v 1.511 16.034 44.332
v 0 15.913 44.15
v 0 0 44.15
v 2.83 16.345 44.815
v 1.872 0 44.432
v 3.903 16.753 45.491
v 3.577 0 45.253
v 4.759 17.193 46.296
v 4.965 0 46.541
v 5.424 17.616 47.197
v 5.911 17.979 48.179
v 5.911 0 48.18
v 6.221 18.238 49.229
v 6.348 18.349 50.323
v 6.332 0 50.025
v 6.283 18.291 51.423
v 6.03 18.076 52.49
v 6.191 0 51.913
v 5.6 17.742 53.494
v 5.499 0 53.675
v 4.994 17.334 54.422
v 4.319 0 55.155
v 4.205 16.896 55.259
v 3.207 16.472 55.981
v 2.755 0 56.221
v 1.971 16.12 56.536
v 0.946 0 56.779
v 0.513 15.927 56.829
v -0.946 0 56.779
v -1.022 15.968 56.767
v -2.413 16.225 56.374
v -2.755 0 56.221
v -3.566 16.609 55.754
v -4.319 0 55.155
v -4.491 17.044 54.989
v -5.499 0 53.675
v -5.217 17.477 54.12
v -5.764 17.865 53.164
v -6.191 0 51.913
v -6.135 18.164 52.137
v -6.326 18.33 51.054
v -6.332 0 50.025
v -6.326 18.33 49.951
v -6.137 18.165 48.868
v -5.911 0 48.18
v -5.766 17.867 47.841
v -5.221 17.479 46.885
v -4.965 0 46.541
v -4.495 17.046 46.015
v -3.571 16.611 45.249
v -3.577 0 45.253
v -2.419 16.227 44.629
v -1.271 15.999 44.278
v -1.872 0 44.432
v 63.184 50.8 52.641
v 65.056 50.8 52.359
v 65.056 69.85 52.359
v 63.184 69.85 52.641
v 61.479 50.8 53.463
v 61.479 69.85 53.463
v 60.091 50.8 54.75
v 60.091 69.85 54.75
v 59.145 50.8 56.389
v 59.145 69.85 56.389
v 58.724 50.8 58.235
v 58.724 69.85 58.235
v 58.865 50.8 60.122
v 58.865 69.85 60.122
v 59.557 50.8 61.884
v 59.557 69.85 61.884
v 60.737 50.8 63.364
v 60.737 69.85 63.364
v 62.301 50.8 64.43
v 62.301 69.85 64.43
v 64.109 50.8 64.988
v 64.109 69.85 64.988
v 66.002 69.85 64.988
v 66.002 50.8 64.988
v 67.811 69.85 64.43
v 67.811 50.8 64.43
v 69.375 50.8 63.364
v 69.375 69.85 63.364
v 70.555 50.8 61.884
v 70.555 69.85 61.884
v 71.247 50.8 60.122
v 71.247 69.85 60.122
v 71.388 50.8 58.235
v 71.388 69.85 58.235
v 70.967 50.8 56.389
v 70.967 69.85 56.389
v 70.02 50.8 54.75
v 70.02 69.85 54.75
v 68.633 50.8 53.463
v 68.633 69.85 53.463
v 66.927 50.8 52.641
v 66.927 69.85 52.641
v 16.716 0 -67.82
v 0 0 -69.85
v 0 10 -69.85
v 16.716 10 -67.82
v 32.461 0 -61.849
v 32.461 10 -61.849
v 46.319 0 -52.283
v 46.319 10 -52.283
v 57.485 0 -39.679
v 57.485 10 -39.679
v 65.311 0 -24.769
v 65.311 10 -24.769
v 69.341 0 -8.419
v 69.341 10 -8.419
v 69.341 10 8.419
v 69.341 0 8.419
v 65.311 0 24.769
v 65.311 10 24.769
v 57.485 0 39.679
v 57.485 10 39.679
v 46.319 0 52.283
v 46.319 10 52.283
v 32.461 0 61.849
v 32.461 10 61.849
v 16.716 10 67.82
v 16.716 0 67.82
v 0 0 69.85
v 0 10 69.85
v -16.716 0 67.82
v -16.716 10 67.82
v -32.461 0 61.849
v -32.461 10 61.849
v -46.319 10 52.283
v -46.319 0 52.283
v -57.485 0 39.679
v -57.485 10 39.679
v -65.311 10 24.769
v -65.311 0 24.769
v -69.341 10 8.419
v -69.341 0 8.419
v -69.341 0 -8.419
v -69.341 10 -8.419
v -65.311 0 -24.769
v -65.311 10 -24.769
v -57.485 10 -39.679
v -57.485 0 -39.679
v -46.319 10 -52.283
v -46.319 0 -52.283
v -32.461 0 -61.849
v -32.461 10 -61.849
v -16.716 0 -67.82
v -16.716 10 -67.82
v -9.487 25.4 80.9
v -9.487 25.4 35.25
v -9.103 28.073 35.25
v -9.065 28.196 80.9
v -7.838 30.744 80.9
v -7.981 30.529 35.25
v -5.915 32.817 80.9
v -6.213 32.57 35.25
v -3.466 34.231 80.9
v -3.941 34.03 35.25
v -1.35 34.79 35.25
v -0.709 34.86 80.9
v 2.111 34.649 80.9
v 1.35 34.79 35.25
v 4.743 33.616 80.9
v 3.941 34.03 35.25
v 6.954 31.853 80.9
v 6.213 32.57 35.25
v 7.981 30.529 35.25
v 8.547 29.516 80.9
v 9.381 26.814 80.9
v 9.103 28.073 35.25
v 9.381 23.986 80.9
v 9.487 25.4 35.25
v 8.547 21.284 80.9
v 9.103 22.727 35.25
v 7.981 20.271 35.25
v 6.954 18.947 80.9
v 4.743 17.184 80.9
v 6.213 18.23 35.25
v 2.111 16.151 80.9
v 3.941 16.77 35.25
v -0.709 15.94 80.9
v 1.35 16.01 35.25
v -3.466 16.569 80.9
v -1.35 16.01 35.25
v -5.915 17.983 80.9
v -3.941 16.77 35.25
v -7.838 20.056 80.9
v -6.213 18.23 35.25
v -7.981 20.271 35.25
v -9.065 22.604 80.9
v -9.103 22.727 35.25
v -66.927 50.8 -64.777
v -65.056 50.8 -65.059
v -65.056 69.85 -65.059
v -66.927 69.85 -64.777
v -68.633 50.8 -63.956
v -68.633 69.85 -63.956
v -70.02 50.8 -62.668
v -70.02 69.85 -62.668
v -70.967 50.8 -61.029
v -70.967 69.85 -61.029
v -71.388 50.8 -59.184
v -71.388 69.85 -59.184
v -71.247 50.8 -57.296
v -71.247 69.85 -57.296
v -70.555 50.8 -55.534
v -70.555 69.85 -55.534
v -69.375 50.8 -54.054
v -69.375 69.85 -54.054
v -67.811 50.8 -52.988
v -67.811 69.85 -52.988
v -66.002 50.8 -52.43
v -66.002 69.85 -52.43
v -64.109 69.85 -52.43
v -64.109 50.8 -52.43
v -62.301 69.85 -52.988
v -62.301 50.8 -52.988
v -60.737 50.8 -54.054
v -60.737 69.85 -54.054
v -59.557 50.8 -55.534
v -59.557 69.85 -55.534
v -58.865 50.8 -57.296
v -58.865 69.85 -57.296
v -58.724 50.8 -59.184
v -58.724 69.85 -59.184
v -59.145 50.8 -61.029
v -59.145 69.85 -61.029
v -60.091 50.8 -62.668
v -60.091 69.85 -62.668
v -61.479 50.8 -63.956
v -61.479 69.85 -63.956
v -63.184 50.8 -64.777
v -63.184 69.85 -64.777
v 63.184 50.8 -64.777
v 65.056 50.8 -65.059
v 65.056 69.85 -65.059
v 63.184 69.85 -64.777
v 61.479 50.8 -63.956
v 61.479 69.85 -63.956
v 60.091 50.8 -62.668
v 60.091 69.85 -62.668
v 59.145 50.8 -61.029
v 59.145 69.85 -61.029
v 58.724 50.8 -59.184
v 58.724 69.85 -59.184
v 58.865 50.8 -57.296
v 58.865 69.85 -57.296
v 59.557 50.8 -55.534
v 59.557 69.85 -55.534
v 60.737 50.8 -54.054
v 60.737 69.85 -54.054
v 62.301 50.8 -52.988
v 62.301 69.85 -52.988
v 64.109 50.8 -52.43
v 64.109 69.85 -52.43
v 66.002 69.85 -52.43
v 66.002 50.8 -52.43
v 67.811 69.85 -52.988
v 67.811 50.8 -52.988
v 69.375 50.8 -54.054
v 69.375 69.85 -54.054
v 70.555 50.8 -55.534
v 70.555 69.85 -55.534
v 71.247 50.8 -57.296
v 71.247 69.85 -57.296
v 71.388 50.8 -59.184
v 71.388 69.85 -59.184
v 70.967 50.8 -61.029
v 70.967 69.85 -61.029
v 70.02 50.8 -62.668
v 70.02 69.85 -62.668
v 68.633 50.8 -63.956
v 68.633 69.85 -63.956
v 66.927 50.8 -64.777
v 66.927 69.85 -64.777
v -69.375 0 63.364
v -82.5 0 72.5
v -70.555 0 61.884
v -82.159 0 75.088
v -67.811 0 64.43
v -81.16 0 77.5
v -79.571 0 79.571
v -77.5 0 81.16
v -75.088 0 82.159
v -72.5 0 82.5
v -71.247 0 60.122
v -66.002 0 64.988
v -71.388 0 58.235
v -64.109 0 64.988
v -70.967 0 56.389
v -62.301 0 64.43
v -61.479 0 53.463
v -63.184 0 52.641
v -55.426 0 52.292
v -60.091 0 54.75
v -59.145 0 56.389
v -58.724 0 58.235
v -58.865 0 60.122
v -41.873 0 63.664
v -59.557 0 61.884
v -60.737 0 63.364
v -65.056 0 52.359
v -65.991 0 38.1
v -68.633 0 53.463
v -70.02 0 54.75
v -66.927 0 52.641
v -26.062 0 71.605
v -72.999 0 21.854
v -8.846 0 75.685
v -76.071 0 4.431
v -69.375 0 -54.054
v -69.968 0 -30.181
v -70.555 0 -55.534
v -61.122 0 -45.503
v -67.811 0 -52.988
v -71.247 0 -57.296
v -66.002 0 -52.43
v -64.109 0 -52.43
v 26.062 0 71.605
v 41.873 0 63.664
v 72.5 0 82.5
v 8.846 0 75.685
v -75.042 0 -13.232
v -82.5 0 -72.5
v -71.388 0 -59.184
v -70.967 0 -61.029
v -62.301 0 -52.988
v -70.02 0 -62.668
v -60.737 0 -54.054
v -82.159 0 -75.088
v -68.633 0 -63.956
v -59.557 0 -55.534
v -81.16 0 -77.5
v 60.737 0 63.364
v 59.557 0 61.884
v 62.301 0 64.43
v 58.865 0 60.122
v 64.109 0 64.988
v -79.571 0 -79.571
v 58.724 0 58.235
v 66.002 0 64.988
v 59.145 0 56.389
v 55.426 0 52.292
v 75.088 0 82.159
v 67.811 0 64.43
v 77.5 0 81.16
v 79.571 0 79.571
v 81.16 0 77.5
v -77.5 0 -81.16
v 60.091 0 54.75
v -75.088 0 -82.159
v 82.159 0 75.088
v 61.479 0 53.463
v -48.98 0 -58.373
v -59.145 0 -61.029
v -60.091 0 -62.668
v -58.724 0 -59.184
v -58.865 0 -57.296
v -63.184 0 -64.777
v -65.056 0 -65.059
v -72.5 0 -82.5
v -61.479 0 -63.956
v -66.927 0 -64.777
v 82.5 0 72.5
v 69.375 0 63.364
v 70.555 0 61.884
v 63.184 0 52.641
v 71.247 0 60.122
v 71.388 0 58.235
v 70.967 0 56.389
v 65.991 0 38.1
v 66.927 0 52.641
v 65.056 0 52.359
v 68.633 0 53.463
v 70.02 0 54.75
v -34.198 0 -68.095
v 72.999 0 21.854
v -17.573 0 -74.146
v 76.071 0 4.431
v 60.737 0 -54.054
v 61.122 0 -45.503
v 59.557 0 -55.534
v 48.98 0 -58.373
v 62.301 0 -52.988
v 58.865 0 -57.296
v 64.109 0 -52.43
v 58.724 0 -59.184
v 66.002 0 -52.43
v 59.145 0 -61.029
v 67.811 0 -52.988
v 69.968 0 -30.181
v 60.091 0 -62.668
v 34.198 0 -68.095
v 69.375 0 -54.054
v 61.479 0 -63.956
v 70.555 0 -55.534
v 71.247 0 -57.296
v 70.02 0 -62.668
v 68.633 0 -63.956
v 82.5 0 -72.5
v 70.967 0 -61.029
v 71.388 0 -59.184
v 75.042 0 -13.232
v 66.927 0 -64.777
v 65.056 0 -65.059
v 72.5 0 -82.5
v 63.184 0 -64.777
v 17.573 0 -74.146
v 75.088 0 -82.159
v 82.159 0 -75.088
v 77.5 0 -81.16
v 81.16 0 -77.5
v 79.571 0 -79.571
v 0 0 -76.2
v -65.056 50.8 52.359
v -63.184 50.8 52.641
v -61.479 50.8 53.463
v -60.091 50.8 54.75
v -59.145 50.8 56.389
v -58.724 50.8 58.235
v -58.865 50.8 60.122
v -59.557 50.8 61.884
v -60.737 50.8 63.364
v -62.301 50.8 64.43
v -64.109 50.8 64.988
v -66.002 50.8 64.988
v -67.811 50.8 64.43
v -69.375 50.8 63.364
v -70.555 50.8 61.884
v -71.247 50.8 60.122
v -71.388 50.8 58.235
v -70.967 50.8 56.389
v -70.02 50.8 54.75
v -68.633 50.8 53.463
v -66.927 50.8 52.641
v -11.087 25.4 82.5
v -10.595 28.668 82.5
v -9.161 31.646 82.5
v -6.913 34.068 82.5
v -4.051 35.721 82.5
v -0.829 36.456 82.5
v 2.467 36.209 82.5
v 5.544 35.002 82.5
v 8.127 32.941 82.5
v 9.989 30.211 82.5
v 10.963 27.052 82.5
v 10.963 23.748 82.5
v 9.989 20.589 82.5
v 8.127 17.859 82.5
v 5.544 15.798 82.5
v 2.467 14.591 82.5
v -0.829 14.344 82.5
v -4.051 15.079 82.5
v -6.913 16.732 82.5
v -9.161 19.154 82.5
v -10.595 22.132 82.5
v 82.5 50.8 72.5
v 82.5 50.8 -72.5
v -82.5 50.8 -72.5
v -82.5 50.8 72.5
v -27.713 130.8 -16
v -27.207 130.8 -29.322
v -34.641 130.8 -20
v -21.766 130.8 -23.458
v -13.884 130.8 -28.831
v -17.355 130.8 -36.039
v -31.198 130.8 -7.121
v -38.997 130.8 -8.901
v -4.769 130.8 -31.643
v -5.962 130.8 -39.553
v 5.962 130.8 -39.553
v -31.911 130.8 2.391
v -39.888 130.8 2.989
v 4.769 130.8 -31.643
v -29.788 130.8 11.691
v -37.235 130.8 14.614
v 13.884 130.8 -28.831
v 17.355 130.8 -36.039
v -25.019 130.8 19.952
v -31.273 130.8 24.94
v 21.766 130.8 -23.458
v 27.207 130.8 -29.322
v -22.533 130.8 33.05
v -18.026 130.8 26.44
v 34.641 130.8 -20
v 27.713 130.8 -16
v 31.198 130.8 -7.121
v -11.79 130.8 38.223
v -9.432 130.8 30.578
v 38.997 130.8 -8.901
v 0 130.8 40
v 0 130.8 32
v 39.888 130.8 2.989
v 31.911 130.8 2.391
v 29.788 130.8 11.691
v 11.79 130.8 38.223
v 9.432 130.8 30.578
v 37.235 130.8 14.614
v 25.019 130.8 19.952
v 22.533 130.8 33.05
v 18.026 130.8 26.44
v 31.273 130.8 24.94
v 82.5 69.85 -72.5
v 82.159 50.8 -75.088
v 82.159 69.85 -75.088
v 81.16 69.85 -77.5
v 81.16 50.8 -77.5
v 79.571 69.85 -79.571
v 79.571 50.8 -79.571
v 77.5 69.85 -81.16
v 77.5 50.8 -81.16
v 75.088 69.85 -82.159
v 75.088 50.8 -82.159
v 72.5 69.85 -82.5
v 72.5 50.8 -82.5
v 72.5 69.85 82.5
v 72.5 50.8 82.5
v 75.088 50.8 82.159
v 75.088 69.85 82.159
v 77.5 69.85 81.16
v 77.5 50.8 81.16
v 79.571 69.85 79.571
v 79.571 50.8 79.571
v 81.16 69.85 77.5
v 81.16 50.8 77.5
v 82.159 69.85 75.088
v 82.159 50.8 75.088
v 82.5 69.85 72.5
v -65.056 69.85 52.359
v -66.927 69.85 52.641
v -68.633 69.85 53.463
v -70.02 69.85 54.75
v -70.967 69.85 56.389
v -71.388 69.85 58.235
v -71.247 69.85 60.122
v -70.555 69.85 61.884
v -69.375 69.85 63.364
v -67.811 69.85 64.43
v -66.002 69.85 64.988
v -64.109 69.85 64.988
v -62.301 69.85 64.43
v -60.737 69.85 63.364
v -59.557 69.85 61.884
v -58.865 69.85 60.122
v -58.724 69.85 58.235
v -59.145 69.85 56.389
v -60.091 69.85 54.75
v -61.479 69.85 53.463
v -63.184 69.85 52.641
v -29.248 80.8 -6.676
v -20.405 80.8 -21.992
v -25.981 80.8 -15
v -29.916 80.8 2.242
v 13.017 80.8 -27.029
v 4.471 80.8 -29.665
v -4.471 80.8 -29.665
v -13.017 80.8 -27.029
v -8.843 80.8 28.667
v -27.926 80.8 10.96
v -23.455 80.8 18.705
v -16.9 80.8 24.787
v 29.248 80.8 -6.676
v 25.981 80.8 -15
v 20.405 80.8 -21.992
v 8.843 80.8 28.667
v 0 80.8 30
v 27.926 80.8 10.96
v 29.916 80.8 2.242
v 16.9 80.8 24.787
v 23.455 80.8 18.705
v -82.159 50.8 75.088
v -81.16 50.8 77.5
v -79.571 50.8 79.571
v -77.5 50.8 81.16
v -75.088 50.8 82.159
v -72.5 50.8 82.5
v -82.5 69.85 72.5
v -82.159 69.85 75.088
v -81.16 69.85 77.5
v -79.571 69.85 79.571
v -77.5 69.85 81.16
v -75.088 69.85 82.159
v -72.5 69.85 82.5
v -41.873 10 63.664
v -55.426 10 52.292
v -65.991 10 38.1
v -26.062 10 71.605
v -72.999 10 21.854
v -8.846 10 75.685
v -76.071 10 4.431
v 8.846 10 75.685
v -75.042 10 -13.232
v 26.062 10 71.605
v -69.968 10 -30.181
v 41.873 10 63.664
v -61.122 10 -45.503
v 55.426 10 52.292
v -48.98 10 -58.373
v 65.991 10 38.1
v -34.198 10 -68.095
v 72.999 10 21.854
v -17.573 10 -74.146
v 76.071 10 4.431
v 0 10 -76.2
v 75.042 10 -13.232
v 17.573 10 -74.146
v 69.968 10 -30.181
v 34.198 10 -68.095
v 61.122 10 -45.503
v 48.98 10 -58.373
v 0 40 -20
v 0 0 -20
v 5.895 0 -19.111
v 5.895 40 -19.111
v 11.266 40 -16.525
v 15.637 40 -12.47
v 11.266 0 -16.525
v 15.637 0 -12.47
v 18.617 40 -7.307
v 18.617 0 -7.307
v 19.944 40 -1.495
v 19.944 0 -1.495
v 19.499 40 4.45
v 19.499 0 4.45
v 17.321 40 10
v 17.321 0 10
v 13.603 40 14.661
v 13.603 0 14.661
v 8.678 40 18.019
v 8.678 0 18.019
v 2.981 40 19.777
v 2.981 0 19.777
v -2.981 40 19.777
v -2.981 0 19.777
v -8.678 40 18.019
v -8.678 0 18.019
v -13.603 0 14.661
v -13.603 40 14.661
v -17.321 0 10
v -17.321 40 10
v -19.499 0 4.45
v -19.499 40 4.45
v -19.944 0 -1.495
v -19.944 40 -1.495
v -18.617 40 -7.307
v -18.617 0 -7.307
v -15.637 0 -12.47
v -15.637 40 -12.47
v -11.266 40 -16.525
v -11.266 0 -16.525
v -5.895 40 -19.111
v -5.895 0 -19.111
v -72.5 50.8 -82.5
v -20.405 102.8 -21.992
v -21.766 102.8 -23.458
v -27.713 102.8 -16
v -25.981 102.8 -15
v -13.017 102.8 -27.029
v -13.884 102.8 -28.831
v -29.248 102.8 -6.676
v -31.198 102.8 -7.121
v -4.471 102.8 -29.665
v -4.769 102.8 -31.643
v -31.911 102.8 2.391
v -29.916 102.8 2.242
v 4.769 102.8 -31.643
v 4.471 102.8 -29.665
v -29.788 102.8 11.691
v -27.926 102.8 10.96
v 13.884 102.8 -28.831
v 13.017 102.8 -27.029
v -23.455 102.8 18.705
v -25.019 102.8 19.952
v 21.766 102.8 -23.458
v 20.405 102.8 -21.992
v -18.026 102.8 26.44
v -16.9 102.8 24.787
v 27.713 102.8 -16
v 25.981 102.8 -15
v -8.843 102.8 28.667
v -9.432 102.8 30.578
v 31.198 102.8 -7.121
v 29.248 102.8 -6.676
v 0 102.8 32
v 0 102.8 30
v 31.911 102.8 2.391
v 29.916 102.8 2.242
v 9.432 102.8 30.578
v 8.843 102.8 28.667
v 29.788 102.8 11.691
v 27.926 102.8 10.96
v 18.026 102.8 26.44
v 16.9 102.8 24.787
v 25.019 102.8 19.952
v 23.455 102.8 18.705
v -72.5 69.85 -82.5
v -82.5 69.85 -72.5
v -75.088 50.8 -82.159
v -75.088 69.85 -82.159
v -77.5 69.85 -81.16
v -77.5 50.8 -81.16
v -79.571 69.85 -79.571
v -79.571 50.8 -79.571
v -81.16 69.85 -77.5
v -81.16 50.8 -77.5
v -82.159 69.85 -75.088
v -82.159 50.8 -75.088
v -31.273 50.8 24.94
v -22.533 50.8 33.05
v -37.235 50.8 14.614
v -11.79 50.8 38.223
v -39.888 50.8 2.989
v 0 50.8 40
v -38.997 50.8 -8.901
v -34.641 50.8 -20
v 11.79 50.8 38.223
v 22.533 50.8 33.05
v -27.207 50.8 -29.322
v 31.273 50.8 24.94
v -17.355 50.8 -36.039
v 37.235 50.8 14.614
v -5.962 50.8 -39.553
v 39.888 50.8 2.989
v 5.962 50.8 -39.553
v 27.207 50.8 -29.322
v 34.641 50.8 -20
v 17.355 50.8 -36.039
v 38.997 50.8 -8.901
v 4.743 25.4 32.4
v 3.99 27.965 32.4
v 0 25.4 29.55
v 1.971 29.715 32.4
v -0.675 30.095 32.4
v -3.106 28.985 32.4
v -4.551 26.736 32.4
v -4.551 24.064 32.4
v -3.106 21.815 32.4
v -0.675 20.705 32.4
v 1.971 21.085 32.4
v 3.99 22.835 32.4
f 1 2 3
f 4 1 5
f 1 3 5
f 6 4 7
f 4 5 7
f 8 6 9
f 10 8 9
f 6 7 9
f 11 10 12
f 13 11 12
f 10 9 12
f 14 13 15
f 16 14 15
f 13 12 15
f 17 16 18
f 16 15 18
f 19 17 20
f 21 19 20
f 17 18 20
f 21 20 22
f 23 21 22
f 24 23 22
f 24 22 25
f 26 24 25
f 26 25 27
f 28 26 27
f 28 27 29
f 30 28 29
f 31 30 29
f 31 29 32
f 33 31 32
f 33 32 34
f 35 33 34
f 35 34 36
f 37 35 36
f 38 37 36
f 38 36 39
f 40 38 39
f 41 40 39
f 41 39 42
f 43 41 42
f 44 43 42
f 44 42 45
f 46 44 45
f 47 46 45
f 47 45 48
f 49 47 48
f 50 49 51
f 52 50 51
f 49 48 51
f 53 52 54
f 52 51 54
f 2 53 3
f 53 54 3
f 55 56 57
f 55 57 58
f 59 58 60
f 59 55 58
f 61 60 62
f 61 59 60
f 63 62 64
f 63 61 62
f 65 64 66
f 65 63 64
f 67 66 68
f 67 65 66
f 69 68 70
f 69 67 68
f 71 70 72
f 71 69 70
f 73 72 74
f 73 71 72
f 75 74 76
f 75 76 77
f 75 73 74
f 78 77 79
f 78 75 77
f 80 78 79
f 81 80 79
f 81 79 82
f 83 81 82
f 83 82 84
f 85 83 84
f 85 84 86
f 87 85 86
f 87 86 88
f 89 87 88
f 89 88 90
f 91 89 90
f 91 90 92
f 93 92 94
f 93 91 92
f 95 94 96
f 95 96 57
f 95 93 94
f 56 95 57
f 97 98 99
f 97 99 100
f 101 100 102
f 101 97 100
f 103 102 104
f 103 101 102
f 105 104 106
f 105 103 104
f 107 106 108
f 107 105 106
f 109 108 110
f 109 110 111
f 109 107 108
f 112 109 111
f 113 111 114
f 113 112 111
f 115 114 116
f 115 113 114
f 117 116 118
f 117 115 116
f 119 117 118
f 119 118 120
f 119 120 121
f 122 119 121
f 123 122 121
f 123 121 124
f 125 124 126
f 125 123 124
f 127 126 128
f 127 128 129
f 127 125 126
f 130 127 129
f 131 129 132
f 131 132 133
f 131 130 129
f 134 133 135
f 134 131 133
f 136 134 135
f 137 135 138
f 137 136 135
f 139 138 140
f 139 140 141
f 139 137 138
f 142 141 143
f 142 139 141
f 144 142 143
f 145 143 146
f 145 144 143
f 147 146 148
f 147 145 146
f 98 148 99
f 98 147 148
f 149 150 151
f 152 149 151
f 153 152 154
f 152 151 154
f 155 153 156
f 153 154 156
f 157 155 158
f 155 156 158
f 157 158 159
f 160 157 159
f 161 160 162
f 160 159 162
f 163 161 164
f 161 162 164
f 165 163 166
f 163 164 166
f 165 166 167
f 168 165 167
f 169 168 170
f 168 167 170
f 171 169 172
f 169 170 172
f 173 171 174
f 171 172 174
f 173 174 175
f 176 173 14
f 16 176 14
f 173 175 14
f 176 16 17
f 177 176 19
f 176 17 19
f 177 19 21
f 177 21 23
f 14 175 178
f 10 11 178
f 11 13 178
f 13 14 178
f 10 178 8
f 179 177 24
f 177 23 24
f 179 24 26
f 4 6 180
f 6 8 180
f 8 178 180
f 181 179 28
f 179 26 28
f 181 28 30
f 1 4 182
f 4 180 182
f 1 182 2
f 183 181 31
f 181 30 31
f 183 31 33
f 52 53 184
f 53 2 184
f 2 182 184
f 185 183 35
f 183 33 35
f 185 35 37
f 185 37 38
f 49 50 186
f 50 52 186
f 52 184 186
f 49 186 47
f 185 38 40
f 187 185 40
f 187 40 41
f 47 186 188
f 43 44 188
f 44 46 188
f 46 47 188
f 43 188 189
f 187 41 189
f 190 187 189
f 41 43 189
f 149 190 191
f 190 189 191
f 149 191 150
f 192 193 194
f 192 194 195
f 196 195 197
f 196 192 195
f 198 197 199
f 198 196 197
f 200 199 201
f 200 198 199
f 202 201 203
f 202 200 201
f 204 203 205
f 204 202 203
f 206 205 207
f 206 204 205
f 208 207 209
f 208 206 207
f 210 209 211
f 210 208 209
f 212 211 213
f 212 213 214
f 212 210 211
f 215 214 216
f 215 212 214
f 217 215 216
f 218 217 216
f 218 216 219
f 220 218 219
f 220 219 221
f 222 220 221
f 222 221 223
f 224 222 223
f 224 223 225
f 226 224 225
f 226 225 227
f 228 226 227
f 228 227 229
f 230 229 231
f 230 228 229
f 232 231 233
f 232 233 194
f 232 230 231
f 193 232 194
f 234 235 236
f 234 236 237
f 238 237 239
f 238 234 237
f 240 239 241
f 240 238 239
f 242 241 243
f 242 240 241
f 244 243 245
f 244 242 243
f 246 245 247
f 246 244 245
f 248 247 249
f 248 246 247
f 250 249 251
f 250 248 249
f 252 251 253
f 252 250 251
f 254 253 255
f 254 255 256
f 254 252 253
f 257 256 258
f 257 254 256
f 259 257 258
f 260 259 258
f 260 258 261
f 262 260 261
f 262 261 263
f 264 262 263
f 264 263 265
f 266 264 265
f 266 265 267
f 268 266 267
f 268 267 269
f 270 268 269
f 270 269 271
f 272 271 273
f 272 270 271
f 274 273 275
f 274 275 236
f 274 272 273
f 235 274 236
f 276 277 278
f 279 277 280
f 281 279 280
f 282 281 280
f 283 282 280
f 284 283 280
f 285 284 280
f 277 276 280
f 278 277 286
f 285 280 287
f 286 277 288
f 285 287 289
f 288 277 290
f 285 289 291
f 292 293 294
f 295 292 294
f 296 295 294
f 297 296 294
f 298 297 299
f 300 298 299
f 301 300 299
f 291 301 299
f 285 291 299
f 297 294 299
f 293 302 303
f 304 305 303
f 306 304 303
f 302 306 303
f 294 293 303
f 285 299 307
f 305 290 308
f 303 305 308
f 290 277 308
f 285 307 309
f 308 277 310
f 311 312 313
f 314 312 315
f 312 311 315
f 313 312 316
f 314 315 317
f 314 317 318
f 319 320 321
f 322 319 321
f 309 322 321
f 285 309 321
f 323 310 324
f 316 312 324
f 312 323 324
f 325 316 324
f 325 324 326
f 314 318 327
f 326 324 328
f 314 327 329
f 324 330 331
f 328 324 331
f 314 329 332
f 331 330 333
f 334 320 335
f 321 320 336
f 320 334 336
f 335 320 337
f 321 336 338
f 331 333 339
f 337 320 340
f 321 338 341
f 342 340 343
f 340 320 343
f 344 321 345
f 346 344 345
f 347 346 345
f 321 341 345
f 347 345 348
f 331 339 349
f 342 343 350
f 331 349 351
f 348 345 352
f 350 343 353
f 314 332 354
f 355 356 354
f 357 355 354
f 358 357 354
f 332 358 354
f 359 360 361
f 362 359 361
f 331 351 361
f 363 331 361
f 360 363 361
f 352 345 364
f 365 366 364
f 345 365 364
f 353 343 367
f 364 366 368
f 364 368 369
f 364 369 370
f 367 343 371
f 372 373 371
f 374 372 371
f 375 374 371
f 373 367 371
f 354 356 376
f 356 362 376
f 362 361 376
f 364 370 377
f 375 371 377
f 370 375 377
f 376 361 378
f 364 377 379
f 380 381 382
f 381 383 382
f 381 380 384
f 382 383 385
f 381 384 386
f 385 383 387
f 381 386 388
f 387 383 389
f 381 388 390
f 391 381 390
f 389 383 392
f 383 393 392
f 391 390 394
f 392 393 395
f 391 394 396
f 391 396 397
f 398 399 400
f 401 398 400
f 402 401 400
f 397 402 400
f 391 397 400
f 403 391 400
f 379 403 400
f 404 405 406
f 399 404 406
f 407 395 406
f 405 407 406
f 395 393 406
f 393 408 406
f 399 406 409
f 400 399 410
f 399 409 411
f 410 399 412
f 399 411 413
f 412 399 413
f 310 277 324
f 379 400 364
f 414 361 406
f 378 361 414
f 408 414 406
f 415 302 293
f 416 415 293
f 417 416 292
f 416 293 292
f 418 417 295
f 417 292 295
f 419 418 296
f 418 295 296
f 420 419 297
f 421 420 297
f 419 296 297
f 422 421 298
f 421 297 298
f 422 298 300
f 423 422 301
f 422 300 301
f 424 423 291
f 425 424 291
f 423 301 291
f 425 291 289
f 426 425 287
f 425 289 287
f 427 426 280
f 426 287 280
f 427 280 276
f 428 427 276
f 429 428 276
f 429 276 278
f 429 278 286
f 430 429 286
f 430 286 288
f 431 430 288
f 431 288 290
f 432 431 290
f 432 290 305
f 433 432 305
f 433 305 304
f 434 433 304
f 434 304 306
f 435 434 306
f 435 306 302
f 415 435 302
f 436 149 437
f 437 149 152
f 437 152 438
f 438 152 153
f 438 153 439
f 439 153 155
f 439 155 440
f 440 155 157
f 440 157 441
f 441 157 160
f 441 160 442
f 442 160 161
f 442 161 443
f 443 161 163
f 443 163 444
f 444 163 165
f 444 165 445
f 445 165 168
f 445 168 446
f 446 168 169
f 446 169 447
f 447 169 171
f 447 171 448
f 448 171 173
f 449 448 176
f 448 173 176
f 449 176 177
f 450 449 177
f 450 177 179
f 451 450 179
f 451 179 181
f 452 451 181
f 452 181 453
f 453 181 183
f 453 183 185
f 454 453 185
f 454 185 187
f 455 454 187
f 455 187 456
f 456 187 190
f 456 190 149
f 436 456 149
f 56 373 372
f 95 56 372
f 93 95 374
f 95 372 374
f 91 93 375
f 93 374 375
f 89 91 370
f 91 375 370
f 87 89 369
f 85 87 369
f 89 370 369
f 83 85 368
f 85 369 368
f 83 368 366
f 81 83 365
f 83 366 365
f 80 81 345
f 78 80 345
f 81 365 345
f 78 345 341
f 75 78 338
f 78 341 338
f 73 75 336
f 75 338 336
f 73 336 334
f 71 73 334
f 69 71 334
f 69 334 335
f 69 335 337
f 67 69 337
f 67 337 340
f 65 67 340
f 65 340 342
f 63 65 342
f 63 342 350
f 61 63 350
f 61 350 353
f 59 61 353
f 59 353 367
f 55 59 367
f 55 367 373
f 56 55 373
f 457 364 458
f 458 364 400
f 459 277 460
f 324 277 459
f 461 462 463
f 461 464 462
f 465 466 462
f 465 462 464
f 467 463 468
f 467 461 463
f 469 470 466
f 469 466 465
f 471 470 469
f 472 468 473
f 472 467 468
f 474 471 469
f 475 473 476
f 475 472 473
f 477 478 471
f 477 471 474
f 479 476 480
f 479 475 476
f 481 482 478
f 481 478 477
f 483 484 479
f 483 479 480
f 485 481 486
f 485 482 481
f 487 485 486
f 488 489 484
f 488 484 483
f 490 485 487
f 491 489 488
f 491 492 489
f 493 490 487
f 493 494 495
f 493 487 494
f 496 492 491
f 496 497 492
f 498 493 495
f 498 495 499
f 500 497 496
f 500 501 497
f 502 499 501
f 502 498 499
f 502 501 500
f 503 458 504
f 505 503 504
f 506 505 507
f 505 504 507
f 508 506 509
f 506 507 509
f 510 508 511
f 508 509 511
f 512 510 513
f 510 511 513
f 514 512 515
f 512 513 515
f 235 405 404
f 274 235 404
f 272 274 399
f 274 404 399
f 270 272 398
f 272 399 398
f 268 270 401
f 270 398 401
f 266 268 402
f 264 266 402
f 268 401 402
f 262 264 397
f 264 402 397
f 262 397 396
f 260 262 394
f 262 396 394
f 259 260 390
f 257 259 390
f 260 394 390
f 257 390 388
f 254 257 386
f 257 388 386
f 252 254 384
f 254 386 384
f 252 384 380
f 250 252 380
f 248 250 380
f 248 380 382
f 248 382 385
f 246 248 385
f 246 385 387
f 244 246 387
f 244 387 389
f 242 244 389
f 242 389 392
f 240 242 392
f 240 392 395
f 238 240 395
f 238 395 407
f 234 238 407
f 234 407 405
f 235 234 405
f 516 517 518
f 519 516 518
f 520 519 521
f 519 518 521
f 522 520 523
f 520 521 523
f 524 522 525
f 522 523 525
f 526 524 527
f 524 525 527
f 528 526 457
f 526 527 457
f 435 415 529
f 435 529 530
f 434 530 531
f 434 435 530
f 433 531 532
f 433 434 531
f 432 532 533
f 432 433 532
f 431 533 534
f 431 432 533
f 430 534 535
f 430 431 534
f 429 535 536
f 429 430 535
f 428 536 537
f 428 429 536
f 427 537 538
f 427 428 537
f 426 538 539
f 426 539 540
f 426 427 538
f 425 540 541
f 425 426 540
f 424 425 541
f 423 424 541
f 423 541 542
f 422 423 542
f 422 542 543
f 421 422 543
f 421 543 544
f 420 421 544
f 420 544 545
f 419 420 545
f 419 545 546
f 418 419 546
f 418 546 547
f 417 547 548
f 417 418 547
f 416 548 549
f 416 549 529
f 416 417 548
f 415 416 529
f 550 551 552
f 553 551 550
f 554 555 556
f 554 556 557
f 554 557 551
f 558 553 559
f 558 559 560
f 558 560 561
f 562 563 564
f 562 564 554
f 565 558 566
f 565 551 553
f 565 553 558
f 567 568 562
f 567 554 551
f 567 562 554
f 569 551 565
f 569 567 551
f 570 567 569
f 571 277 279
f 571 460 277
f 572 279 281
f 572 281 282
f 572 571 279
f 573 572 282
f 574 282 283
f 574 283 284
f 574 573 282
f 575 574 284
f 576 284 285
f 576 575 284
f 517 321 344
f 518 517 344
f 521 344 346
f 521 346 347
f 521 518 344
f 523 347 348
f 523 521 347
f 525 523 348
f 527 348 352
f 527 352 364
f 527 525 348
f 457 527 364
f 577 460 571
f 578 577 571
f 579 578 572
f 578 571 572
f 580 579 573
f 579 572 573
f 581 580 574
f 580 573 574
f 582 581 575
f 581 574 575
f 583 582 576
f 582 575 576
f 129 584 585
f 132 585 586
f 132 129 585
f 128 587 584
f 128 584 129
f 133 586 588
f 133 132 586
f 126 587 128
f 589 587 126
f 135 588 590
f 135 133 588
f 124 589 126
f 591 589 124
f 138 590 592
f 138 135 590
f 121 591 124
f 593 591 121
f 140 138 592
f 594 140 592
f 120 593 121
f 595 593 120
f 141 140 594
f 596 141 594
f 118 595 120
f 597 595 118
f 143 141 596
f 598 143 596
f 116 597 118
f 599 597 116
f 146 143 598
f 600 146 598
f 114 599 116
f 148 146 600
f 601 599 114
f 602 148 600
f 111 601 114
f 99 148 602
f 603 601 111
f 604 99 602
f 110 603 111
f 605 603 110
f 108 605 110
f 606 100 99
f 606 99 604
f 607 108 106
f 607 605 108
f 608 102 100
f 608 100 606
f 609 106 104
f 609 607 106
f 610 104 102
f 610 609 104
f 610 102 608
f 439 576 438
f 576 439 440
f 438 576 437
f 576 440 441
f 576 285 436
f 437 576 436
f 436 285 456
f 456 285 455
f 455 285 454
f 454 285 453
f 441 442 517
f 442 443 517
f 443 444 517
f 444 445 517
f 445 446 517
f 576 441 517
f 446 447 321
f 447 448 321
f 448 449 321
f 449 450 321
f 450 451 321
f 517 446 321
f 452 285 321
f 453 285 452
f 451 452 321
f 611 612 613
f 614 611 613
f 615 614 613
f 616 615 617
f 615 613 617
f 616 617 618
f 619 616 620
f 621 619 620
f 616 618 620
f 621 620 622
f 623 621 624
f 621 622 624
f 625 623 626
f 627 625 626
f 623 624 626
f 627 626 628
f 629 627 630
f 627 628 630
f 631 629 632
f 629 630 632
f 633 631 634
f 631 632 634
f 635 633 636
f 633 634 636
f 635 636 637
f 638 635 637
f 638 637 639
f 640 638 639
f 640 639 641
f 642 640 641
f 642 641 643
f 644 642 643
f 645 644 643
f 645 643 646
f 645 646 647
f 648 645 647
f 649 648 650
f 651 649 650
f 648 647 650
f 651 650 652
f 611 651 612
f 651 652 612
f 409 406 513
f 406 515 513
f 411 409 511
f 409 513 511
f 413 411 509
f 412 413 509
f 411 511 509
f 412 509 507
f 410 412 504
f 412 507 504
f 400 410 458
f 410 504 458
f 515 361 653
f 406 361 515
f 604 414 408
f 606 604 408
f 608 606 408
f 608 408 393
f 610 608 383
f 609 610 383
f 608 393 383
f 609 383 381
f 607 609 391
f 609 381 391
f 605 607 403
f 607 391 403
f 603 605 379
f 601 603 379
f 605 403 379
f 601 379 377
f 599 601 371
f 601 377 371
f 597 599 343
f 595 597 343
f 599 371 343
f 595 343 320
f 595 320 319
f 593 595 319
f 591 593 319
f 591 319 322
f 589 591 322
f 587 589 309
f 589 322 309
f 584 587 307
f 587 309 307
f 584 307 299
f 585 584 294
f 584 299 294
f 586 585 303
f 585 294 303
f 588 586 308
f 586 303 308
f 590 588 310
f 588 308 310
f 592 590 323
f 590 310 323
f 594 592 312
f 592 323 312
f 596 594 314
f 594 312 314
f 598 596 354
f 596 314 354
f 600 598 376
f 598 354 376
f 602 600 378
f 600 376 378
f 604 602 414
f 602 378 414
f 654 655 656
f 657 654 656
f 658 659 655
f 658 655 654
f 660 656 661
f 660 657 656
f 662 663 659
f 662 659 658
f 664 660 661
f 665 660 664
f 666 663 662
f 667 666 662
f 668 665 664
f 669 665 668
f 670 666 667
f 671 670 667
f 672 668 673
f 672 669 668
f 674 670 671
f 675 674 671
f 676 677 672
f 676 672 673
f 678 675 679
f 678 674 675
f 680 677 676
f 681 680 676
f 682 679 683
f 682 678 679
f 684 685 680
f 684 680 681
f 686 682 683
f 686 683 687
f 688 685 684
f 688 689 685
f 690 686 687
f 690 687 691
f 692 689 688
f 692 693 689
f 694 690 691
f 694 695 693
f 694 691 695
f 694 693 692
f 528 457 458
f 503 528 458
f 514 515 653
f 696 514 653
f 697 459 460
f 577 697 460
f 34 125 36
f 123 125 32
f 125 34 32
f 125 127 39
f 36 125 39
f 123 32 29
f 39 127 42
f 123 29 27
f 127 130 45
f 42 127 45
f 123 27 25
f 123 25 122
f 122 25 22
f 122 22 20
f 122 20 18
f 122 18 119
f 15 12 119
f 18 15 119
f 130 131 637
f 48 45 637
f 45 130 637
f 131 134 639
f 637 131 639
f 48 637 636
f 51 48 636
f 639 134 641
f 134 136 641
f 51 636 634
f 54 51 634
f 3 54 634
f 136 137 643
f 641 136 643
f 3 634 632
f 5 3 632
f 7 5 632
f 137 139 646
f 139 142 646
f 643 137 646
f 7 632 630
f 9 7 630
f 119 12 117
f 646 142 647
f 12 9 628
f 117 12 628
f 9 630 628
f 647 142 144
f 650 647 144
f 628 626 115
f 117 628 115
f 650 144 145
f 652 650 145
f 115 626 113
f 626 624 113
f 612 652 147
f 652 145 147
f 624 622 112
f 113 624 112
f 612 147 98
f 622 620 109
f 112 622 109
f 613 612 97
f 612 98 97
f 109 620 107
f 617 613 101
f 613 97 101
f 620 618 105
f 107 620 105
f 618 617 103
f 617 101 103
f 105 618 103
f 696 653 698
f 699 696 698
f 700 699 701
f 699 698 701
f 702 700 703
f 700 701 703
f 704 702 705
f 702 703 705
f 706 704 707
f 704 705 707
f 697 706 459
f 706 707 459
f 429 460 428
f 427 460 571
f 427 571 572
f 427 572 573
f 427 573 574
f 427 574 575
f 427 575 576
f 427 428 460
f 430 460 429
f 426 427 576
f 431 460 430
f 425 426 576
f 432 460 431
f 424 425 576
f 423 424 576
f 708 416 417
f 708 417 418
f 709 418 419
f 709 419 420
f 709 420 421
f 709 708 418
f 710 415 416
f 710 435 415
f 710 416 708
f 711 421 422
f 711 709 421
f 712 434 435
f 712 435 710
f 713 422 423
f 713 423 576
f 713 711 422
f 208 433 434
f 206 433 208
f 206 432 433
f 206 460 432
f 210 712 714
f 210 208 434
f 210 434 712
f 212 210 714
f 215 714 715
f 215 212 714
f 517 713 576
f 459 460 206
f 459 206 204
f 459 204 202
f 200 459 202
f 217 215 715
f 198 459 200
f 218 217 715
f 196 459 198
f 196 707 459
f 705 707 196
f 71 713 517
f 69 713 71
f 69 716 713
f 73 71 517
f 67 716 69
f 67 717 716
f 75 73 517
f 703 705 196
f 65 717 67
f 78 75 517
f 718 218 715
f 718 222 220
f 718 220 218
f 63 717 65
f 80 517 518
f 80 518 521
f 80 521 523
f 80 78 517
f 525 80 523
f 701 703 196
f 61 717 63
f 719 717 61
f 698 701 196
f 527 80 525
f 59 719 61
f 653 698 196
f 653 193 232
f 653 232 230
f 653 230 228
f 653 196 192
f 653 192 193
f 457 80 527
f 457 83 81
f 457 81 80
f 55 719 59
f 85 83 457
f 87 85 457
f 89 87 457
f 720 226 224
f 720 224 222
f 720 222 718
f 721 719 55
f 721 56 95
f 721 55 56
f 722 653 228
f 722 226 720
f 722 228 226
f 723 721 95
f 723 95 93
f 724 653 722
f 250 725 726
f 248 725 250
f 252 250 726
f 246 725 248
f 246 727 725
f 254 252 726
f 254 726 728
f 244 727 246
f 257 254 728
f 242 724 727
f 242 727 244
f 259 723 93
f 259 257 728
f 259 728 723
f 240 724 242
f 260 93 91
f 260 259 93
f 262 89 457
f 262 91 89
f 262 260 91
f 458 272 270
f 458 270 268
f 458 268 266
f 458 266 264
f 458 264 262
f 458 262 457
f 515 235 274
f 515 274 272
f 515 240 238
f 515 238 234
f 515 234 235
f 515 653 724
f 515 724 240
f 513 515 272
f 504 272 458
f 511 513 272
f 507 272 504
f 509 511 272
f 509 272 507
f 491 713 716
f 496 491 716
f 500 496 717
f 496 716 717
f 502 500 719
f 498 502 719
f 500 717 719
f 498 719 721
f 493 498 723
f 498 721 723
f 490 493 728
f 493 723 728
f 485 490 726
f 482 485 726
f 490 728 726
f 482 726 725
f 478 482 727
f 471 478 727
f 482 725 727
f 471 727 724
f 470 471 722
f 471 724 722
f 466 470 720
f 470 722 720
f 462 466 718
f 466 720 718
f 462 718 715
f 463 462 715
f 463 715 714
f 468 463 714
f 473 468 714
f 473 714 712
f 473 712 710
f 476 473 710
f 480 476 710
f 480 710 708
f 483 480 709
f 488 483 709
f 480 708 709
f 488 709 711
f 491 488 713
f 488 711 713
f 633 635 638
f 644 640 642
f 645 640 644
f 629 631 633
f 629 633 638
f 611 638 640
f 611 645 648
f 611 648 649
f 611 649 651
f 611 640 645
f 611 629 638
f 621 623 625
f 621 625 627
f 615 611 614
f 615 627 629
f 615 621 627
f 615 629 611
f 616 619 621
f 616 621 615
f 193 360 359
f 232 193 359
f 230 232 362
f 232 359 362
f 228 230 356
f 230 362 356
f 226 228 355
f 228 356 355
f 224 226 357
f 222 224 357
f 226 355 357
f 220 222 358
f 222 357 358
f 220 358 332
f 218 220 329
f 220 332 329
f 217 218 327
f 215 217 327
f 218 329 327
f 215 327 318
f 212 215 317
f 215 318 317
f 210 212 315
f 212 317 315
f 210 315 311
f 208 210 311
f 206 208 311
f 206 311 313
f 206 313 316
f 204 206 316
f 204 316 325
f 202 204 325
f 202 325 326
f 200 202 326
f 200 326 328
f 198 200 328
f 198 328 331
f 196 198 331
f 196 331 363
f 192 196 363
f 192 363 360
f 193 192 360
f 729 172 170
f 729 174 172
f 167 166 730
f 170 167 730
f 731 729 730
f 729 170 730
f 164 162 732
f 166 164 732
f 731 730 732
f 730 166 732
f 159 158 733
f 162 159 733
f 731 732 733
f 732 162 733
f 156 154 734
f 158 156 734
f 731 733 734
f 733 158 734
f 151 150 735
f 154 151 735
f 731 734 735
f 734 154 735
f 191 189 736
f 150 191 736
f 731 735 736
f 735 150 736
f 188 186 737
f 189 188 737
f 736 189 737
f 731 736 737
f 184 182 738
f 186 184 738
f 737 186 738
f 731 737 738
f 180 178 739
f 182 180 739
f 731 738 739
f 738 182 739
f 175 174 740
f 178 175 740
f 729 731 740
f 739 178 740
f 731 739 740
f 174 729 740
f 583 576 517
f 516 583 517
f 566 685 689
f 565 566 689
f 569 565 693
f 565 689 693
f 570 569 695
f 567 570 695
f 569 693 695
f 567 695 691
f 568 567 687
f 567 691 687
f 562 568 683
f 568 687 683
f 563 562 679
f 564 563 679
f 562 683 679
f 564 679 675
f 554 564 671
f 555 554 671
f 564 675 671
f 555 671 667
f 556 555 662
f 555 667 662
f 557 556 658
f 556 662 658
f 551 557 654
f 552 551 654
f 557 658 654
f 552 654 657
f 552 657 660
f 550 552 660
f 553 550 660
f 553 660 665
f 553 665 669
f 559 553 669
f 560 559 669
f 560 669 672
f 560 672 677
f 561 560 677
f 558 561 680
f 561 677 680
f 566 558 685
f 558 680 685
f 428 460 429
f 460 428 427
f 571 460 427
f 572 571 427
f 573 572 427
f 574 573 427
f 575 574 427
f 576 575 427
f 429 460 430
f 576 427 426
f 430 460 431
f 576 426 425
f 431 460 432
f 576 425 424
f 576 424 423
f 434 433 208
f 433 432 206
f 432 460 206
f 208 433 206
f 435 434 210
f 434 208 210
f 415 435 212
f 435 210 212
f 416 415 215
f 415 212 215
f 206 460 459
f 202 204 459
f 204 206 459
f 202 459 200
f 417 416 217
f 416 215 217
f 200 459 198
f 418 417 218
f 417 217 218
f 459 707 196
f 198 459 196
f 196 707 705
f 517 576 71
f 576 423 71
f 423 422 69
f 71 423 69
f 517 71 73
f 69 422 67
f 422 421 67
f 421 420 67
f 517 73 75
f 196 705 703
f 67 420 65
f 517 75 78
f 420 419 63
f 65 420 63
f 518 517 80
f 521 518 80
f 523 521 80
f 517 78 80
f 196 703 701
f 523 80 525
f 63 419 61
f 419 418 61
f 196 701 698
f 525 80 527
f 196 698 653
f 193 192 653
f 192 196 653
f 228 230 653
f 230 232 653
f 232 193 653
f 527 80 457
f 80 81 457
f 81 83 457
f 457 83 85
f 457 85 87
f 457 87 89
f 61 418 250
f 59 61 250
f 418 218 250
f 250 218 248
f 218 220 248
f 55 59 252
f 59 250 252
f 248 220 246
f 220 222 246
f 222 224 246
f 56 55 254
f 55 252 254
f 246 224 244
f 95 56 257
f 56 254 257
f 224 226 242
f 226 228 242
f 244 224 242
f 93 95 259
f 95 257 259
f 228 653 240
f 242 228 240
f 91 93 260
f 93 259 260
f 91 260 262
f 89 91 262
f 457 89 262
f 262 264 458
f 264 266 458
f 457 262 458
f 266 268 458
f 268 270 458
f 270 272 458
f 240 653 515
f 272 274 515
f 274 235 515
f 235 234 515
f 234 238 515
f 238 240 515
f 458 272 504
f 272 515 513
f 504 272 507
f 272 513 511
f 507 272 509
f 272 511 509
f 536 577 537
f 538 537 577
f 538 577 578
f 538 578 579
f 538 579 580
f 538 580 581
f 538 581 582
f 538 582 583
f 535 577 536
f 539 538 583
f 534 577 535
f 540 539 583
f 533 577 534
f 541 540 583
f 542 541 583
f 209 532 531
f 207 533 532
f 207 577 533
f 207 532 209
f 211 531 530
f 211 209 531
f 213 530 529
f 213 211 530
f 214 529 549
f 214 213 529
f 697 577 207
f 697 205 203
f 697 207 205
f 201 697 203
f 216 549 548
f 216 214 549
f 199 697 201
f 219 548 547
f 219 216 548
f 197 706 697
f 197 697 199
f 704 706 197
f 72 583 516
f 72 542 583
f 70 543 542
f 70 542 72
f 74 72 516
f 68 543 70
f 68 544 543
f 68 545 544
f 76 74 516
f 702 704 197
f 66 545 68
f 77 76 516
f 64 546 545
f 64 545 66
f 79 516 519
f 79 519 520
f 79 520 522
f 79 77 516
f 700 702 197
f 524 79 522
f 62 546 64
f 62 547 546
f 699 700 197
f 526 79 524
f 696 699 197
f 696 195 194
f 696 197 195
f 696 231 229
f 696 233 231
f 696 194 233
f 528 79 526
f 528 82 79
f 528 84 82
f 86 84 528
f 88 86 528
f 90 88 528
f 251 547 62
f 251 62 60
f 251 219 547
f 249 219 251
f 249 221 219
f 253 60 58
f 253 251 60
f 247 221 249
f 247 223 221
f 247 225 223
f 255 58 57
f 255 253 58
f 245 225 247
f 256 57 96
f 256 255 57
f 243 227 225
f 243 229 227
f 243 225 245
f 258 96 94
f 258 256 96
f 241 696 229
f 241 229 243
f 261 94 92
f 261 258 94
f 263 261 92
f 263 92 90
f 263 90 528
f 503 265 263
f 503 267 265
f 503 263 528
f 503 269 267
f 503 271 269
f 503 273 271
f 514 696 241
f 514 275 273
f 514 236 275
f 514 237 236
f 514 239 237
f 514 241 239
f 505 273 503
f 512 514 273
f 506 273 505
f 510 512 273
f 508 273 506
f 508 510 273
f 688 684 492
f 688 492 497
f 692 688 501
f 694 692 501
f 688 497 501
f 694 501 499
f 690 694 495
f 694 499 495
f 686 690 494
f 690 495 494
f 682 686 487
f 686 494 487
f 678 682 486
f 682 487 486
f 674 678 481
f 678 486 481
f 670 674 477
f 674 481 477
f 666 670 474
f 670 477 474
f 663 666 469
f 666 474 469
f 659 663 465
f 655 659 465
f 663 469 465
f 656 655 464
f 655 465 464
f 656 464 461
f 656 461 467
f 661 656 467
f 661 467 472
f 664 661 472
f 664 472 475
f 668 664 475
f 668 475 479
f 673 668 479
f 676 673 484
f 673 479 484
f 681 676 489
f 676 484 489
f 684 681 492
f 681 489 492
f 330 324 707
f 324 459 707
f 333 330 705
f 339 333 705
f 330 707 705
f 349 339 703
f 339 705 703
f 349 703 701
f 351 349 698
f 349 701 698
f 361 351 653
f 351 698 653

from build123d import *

# Parameters (mm, degrees)
SKETCH1_W                              = 165
SKETCH1_H                              = 165
BOSS_EXTRUDE1_DEPTH                    = 50.8
SKETCH2_R                              = 40
BOSS_EXTRUDE2_DEPTH                    = 80
SKETCH3_R                              = 32
CUT_EXTRUDE1_DEPTH                     = 28
SKETCH4_R                              = 30
CUT_EXTRUDE2_DEPTH                     = 22
FILLET1_R                              = 10
SKETCH5_R                              = 20
CUT_EXTRUDE3_DEPTH                     = 40
SKETCH6_R                              = 76.2
SKETCH6_R_2                            = 69.85
CUT_EXTRUDE4_DEPTH                     = 10
F_1_2_14_NPSM_TAPPED_HOLE2_D           = 18.9738
F_1_2_14_NPSM_TAPPED_HOLE2_DEPTH       = 47.25
F_1_2_14_NPSM_TAPPED_HOLE2_CSINK_D     = 22.1742
F_1_2_14_NPSM_TAPPED_HOLE2_CSINK_ANGLE = 90
F_1_2_14_NPSM_TAPPED_HOLE2_TIP         = 5.700304607
SKETCH12_R                             = 6.35
CUT_EXTRUDE5_DEPTH                     = 25
SKETCH20_R                             = 6.35
CUT_EXTRUDE6_DEPTH                     = 176.274470474
SKETCH24_R                             = 6.35
BOSS_EXTRUDE4_DEPTH                    = 19.05


with BuildPart() as part:
    # Sketch1 → Boss-Extrude1 (new body)
    with BuildSketch(Plane(origin=(0, 0, 0), x_dir=(1, 0, 0), z_dir=(0, 1, 0))):
        Rectangle(SKETCH1_W, SKETCH1_H)
    extrude(amount=BOSS_EXTRUDE1_DEPTH)

    # Sketch2 → Boss-Extrude2 (add)
    with BuildSketch(Plane(origin=(0, 50.8, 0), x_dir=(1, 0, 0), z_dir=(0, 1, 0))):
        with Locations(Location((0, 0, 0), (0, 0, 270))):
            Circle(SKETCH2_R)
    extrude(amount=BOSS_EXTRUDE2_DEPTH)

    # Sketch3 → Cut-Extrude1 (cut)
    with BuildSketch(Plane(origin=(0, 130.8, 0), x_dir=(1, 0, 0), z_dir=(0, 1, 0))):
        with Locations(Location((0, 0, 0), (0, 0, 270))):
            Circle(SKETCH3_R)
    extrude(amount=-CUT_EXTRUDE1_DEPTH, mode=Mode.SUBTRACT)

    # Sketch4 → Cut-Extrude2 (cut)
    with BuildSketch(Plane(origin=(0, 102.8, 0), x_dir=(1, 0, 0), z_dir=(0, 1, 0))):
        with Locations(Location((0, 0, 0), (0, 0, 270))):
            Circle(SKETCH4_R)
    extrude(amount=-CUT_EXTRUDE2_DEPTH, mode=Mode.SUBTRACT)

    # Fillet1
    fillet1_edges = [part.edges().sort_by_distance(p)[0] for p in [
        (82.5, 25.4, 82.5),
        (-82.5, 25.4, 82.5),
        (-82.5, 25.4, -82.5),
        (82.5, 25.4, -82.5),
    ]]
    fillet(fillet1_edges, radius=FILLET1_R)

    # Sketch5 → Cut-Extrude3 (cut)
    with BuildSketch(Plane.XZ):
        with Locations(Location((0, 0, 0), (0, 0, 270))):
            Circle(SKETCH5_R)
    extrude(amount=-CUT_EXTRUDE3_DEPTH, mode=Mode.SUBTRACT)

    # Sketch6 → Cut-Extrude4 (cut)
    with BuildSketch(Plane.XZ):
        with Locations(Location((0, 0, 0), (0, 0, 270))):
            Circle(SKETCH6_R)
        with Locations(Location((0, 0, 0), (0, 0, 270))):
            Circle(SKETCH6_R_2, mode=Mode.SUBTRACT)
    extrude(amount=-CUT_EXTRUDE4_DEPTH, mode=Mode.SUBTRACT)

    # 1/2-14 NPSM Tapped Hole2
    with Locations(Plane.XY.offset(82.5)):
        with Locations((0, 25.4)):
            CounterSinkHole(F_1_2_14_NPSM_TAPPED_HOLE2_D / 2, F_1_2_14_NPSM_TAPPED_HOLE2_CSINK_D / 2, depth=F_1_2_14_NPSM_TAPPED_HOLE2_DEPTH, counter_sink_angle=F_1_2_14_NPSM_TAPPED_HOLE2_CSINK_ANGLE)
            with Locations((0, 0, -(F_1_2_14_NPSM_TAPPED_HOLE2_DEPTH + F_1_2_14_NPSM_TAPPED_HOLE2_TIP / 2))):  # 118° drill point
                Cone(0, F_1_2_14_NPSM_TAPPED_HOLE2_D / 2, F_1_2_14_NPSM_TAPPED_HOLE2_TIP, mode=Mode.SUBTRACT)

    # Sketch12 → Cut-Extrude5 (cut)
    with BuildSketch(Plane.XZ):
        with Locations(Location((0, 50.5, 0), (0, 0, 270))):
            Circle(SKETCH12_R)
    extrude(amount=-CUT_EXTRUDE5_DEPTH, mode=Mode.SUBTRACT)

    # Sketch20 → Cut-Extrude6 (cut, through all)
    with BuildSketch(Plane.XZ):
        with Locations(Location((-65.055773782, 58.709140665, 0), (0, 0, 270))):
            Circle(SKETCH20_R)
        with Locations(Location((-65.055773782, -58.709140665, 0), (0, 0, 270))):
            Circle(SKETCH20_R)
        with Locations(Location((65.055773782, -58.709140665, 0), (0, 0, 270))):
            Circle(SKETCH20_R)
        with Locations(Location((65.055773782, 58.709140665, 0), (0, 0, 270))):
            Circle(SKETCH20_R)
    extrude(amount=-CUT_EXTRUDE6_DEPTH, mode=Mode.SUBTRACT)


with BuildPart() as body_2:
    # Sketch24 → Boss-Extrude4 (new body)
    with BuildSketch(Plane(origin=(0, 50.8, 0), x_dir=(1, 0, 0), z_dir=(0, 1, 0))):
        with BuildLine():
            Line((-72.5, -82.5), (72.5, -82.5))
            ThreePointArc((72.5, -82.5), (79.571067812, -79.571067812), (82.5, -72.5))
            Line((82.5, -72.5), (82.5, 72.5))
            ThreePointArc((82.5, 72.5), (79.571067812, 79.571067812), (72.5, 82.5))
            Line((72.5, 82.5), (-72.5, 82.5))
            ThreePointArc((-72.5, 82.5), (-79.571067812, 79.571067812), (-82.5, 72.5))
            Line((-82.5, 72.5), (-82.5, -72.5))
            ThreePointArc((-82.5, -72.5), (-79.571067812, -79.571067812), (-72.5, -82.5))
        make_face()
        with Locations(Location((-65.055773782, -58.709140665, 0), (0, 0, 90))):
            Circle(SKETCH24_R, mode=Mode.SUBTRACT)
        with Locations(Location((-65.055773782, 58.709140665, 0), (0, 0, 90))):
            Circle(SKETCH24_R, mode=Mode.SUBTRACT)
        with Locations(Location((65.055773782, -58.709140665, 0), (0, 0, 90))):
            Circle(SKETCH24_R, mode=Mode.SUBTRACT)
        with Locations(Location((65.055773782, 58.709140665, 0), (0, 0, 90))):
            Circle(SKETCH24_R, mode=Mode.SUBTRACT)
    extrude(amount=BOSS_EXTRUDE4_DEPTH)


solid = Compound([part.part, body_2.part])
